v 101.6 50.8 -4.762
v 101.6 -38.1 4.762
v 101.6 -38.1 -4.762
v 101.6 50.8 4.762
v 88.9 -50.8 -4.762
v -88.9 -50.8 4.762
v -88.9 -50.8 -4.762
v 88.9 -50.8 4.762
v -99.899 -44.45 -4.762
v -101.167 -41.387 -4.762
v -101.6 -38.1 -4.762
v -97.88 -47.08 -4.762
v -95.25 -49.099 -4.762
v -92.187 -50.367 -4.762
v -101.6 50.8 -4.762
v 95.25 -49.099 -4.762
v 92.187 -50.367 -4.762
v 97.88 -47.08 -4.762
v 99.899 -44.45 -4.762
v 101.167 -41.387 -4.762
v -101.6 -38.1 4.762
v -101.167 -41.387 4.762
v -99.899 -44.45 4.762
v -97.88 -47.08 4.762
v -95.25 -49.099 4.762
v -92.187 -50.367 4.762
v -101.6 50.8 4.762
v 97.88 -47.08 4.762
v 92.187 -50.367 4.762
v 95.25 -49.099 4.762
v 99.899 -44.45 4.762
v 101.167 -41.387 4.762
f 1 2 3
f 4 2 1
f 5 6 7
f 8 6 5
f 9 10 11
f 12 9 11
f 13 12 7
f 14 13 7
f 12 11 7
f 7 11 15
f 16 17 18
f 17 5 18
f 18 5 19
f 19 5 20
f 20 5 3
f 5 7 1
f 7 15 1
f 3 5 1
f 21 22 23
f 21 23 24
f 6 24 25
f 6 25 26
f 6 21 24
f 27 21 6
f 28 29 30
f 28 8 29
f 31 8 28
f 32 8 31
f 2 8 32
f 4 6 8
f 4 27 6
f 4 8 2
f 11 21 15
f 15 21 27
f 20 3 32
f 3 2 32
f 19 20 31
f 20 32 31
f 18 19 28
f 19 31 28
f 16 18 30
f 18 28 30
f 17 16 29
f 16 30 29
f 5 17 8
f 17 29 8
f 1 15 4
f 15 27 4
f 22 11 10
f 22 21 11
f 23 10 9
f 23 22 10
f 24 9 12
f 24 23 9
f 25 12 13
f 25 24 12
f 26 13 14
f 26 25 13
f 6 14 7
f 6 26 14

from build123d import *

# Parameters (mm, degrees)
SKETCH1_W           = 203.2
SKETCH1_H           = 101.6
BOSS_EXTRUDE1_DEPTH = 4.7625
FILLET1_R           = 12.7


with BuildPart() as part:
    # Sketch1 → Boss-Extrude1 (new body, symmetric)
    with BuildSketch(Plane.XY):
        Rectangle(SKETCH1_W, SKETCH1_H)
    extrude(amount=BOSS_EXTRUDE1_DEPTH, both=True)

    # Fillet1
    fillet1_edges = [part.edges().sort_by_distance(p)[0] for p in [
        (101.6, -50.8, 0),
        (-101.6, -50.8, 0),
    ]]
    fillet(fillet1_edges, radius=FILLET1_R)


solid = part.part
